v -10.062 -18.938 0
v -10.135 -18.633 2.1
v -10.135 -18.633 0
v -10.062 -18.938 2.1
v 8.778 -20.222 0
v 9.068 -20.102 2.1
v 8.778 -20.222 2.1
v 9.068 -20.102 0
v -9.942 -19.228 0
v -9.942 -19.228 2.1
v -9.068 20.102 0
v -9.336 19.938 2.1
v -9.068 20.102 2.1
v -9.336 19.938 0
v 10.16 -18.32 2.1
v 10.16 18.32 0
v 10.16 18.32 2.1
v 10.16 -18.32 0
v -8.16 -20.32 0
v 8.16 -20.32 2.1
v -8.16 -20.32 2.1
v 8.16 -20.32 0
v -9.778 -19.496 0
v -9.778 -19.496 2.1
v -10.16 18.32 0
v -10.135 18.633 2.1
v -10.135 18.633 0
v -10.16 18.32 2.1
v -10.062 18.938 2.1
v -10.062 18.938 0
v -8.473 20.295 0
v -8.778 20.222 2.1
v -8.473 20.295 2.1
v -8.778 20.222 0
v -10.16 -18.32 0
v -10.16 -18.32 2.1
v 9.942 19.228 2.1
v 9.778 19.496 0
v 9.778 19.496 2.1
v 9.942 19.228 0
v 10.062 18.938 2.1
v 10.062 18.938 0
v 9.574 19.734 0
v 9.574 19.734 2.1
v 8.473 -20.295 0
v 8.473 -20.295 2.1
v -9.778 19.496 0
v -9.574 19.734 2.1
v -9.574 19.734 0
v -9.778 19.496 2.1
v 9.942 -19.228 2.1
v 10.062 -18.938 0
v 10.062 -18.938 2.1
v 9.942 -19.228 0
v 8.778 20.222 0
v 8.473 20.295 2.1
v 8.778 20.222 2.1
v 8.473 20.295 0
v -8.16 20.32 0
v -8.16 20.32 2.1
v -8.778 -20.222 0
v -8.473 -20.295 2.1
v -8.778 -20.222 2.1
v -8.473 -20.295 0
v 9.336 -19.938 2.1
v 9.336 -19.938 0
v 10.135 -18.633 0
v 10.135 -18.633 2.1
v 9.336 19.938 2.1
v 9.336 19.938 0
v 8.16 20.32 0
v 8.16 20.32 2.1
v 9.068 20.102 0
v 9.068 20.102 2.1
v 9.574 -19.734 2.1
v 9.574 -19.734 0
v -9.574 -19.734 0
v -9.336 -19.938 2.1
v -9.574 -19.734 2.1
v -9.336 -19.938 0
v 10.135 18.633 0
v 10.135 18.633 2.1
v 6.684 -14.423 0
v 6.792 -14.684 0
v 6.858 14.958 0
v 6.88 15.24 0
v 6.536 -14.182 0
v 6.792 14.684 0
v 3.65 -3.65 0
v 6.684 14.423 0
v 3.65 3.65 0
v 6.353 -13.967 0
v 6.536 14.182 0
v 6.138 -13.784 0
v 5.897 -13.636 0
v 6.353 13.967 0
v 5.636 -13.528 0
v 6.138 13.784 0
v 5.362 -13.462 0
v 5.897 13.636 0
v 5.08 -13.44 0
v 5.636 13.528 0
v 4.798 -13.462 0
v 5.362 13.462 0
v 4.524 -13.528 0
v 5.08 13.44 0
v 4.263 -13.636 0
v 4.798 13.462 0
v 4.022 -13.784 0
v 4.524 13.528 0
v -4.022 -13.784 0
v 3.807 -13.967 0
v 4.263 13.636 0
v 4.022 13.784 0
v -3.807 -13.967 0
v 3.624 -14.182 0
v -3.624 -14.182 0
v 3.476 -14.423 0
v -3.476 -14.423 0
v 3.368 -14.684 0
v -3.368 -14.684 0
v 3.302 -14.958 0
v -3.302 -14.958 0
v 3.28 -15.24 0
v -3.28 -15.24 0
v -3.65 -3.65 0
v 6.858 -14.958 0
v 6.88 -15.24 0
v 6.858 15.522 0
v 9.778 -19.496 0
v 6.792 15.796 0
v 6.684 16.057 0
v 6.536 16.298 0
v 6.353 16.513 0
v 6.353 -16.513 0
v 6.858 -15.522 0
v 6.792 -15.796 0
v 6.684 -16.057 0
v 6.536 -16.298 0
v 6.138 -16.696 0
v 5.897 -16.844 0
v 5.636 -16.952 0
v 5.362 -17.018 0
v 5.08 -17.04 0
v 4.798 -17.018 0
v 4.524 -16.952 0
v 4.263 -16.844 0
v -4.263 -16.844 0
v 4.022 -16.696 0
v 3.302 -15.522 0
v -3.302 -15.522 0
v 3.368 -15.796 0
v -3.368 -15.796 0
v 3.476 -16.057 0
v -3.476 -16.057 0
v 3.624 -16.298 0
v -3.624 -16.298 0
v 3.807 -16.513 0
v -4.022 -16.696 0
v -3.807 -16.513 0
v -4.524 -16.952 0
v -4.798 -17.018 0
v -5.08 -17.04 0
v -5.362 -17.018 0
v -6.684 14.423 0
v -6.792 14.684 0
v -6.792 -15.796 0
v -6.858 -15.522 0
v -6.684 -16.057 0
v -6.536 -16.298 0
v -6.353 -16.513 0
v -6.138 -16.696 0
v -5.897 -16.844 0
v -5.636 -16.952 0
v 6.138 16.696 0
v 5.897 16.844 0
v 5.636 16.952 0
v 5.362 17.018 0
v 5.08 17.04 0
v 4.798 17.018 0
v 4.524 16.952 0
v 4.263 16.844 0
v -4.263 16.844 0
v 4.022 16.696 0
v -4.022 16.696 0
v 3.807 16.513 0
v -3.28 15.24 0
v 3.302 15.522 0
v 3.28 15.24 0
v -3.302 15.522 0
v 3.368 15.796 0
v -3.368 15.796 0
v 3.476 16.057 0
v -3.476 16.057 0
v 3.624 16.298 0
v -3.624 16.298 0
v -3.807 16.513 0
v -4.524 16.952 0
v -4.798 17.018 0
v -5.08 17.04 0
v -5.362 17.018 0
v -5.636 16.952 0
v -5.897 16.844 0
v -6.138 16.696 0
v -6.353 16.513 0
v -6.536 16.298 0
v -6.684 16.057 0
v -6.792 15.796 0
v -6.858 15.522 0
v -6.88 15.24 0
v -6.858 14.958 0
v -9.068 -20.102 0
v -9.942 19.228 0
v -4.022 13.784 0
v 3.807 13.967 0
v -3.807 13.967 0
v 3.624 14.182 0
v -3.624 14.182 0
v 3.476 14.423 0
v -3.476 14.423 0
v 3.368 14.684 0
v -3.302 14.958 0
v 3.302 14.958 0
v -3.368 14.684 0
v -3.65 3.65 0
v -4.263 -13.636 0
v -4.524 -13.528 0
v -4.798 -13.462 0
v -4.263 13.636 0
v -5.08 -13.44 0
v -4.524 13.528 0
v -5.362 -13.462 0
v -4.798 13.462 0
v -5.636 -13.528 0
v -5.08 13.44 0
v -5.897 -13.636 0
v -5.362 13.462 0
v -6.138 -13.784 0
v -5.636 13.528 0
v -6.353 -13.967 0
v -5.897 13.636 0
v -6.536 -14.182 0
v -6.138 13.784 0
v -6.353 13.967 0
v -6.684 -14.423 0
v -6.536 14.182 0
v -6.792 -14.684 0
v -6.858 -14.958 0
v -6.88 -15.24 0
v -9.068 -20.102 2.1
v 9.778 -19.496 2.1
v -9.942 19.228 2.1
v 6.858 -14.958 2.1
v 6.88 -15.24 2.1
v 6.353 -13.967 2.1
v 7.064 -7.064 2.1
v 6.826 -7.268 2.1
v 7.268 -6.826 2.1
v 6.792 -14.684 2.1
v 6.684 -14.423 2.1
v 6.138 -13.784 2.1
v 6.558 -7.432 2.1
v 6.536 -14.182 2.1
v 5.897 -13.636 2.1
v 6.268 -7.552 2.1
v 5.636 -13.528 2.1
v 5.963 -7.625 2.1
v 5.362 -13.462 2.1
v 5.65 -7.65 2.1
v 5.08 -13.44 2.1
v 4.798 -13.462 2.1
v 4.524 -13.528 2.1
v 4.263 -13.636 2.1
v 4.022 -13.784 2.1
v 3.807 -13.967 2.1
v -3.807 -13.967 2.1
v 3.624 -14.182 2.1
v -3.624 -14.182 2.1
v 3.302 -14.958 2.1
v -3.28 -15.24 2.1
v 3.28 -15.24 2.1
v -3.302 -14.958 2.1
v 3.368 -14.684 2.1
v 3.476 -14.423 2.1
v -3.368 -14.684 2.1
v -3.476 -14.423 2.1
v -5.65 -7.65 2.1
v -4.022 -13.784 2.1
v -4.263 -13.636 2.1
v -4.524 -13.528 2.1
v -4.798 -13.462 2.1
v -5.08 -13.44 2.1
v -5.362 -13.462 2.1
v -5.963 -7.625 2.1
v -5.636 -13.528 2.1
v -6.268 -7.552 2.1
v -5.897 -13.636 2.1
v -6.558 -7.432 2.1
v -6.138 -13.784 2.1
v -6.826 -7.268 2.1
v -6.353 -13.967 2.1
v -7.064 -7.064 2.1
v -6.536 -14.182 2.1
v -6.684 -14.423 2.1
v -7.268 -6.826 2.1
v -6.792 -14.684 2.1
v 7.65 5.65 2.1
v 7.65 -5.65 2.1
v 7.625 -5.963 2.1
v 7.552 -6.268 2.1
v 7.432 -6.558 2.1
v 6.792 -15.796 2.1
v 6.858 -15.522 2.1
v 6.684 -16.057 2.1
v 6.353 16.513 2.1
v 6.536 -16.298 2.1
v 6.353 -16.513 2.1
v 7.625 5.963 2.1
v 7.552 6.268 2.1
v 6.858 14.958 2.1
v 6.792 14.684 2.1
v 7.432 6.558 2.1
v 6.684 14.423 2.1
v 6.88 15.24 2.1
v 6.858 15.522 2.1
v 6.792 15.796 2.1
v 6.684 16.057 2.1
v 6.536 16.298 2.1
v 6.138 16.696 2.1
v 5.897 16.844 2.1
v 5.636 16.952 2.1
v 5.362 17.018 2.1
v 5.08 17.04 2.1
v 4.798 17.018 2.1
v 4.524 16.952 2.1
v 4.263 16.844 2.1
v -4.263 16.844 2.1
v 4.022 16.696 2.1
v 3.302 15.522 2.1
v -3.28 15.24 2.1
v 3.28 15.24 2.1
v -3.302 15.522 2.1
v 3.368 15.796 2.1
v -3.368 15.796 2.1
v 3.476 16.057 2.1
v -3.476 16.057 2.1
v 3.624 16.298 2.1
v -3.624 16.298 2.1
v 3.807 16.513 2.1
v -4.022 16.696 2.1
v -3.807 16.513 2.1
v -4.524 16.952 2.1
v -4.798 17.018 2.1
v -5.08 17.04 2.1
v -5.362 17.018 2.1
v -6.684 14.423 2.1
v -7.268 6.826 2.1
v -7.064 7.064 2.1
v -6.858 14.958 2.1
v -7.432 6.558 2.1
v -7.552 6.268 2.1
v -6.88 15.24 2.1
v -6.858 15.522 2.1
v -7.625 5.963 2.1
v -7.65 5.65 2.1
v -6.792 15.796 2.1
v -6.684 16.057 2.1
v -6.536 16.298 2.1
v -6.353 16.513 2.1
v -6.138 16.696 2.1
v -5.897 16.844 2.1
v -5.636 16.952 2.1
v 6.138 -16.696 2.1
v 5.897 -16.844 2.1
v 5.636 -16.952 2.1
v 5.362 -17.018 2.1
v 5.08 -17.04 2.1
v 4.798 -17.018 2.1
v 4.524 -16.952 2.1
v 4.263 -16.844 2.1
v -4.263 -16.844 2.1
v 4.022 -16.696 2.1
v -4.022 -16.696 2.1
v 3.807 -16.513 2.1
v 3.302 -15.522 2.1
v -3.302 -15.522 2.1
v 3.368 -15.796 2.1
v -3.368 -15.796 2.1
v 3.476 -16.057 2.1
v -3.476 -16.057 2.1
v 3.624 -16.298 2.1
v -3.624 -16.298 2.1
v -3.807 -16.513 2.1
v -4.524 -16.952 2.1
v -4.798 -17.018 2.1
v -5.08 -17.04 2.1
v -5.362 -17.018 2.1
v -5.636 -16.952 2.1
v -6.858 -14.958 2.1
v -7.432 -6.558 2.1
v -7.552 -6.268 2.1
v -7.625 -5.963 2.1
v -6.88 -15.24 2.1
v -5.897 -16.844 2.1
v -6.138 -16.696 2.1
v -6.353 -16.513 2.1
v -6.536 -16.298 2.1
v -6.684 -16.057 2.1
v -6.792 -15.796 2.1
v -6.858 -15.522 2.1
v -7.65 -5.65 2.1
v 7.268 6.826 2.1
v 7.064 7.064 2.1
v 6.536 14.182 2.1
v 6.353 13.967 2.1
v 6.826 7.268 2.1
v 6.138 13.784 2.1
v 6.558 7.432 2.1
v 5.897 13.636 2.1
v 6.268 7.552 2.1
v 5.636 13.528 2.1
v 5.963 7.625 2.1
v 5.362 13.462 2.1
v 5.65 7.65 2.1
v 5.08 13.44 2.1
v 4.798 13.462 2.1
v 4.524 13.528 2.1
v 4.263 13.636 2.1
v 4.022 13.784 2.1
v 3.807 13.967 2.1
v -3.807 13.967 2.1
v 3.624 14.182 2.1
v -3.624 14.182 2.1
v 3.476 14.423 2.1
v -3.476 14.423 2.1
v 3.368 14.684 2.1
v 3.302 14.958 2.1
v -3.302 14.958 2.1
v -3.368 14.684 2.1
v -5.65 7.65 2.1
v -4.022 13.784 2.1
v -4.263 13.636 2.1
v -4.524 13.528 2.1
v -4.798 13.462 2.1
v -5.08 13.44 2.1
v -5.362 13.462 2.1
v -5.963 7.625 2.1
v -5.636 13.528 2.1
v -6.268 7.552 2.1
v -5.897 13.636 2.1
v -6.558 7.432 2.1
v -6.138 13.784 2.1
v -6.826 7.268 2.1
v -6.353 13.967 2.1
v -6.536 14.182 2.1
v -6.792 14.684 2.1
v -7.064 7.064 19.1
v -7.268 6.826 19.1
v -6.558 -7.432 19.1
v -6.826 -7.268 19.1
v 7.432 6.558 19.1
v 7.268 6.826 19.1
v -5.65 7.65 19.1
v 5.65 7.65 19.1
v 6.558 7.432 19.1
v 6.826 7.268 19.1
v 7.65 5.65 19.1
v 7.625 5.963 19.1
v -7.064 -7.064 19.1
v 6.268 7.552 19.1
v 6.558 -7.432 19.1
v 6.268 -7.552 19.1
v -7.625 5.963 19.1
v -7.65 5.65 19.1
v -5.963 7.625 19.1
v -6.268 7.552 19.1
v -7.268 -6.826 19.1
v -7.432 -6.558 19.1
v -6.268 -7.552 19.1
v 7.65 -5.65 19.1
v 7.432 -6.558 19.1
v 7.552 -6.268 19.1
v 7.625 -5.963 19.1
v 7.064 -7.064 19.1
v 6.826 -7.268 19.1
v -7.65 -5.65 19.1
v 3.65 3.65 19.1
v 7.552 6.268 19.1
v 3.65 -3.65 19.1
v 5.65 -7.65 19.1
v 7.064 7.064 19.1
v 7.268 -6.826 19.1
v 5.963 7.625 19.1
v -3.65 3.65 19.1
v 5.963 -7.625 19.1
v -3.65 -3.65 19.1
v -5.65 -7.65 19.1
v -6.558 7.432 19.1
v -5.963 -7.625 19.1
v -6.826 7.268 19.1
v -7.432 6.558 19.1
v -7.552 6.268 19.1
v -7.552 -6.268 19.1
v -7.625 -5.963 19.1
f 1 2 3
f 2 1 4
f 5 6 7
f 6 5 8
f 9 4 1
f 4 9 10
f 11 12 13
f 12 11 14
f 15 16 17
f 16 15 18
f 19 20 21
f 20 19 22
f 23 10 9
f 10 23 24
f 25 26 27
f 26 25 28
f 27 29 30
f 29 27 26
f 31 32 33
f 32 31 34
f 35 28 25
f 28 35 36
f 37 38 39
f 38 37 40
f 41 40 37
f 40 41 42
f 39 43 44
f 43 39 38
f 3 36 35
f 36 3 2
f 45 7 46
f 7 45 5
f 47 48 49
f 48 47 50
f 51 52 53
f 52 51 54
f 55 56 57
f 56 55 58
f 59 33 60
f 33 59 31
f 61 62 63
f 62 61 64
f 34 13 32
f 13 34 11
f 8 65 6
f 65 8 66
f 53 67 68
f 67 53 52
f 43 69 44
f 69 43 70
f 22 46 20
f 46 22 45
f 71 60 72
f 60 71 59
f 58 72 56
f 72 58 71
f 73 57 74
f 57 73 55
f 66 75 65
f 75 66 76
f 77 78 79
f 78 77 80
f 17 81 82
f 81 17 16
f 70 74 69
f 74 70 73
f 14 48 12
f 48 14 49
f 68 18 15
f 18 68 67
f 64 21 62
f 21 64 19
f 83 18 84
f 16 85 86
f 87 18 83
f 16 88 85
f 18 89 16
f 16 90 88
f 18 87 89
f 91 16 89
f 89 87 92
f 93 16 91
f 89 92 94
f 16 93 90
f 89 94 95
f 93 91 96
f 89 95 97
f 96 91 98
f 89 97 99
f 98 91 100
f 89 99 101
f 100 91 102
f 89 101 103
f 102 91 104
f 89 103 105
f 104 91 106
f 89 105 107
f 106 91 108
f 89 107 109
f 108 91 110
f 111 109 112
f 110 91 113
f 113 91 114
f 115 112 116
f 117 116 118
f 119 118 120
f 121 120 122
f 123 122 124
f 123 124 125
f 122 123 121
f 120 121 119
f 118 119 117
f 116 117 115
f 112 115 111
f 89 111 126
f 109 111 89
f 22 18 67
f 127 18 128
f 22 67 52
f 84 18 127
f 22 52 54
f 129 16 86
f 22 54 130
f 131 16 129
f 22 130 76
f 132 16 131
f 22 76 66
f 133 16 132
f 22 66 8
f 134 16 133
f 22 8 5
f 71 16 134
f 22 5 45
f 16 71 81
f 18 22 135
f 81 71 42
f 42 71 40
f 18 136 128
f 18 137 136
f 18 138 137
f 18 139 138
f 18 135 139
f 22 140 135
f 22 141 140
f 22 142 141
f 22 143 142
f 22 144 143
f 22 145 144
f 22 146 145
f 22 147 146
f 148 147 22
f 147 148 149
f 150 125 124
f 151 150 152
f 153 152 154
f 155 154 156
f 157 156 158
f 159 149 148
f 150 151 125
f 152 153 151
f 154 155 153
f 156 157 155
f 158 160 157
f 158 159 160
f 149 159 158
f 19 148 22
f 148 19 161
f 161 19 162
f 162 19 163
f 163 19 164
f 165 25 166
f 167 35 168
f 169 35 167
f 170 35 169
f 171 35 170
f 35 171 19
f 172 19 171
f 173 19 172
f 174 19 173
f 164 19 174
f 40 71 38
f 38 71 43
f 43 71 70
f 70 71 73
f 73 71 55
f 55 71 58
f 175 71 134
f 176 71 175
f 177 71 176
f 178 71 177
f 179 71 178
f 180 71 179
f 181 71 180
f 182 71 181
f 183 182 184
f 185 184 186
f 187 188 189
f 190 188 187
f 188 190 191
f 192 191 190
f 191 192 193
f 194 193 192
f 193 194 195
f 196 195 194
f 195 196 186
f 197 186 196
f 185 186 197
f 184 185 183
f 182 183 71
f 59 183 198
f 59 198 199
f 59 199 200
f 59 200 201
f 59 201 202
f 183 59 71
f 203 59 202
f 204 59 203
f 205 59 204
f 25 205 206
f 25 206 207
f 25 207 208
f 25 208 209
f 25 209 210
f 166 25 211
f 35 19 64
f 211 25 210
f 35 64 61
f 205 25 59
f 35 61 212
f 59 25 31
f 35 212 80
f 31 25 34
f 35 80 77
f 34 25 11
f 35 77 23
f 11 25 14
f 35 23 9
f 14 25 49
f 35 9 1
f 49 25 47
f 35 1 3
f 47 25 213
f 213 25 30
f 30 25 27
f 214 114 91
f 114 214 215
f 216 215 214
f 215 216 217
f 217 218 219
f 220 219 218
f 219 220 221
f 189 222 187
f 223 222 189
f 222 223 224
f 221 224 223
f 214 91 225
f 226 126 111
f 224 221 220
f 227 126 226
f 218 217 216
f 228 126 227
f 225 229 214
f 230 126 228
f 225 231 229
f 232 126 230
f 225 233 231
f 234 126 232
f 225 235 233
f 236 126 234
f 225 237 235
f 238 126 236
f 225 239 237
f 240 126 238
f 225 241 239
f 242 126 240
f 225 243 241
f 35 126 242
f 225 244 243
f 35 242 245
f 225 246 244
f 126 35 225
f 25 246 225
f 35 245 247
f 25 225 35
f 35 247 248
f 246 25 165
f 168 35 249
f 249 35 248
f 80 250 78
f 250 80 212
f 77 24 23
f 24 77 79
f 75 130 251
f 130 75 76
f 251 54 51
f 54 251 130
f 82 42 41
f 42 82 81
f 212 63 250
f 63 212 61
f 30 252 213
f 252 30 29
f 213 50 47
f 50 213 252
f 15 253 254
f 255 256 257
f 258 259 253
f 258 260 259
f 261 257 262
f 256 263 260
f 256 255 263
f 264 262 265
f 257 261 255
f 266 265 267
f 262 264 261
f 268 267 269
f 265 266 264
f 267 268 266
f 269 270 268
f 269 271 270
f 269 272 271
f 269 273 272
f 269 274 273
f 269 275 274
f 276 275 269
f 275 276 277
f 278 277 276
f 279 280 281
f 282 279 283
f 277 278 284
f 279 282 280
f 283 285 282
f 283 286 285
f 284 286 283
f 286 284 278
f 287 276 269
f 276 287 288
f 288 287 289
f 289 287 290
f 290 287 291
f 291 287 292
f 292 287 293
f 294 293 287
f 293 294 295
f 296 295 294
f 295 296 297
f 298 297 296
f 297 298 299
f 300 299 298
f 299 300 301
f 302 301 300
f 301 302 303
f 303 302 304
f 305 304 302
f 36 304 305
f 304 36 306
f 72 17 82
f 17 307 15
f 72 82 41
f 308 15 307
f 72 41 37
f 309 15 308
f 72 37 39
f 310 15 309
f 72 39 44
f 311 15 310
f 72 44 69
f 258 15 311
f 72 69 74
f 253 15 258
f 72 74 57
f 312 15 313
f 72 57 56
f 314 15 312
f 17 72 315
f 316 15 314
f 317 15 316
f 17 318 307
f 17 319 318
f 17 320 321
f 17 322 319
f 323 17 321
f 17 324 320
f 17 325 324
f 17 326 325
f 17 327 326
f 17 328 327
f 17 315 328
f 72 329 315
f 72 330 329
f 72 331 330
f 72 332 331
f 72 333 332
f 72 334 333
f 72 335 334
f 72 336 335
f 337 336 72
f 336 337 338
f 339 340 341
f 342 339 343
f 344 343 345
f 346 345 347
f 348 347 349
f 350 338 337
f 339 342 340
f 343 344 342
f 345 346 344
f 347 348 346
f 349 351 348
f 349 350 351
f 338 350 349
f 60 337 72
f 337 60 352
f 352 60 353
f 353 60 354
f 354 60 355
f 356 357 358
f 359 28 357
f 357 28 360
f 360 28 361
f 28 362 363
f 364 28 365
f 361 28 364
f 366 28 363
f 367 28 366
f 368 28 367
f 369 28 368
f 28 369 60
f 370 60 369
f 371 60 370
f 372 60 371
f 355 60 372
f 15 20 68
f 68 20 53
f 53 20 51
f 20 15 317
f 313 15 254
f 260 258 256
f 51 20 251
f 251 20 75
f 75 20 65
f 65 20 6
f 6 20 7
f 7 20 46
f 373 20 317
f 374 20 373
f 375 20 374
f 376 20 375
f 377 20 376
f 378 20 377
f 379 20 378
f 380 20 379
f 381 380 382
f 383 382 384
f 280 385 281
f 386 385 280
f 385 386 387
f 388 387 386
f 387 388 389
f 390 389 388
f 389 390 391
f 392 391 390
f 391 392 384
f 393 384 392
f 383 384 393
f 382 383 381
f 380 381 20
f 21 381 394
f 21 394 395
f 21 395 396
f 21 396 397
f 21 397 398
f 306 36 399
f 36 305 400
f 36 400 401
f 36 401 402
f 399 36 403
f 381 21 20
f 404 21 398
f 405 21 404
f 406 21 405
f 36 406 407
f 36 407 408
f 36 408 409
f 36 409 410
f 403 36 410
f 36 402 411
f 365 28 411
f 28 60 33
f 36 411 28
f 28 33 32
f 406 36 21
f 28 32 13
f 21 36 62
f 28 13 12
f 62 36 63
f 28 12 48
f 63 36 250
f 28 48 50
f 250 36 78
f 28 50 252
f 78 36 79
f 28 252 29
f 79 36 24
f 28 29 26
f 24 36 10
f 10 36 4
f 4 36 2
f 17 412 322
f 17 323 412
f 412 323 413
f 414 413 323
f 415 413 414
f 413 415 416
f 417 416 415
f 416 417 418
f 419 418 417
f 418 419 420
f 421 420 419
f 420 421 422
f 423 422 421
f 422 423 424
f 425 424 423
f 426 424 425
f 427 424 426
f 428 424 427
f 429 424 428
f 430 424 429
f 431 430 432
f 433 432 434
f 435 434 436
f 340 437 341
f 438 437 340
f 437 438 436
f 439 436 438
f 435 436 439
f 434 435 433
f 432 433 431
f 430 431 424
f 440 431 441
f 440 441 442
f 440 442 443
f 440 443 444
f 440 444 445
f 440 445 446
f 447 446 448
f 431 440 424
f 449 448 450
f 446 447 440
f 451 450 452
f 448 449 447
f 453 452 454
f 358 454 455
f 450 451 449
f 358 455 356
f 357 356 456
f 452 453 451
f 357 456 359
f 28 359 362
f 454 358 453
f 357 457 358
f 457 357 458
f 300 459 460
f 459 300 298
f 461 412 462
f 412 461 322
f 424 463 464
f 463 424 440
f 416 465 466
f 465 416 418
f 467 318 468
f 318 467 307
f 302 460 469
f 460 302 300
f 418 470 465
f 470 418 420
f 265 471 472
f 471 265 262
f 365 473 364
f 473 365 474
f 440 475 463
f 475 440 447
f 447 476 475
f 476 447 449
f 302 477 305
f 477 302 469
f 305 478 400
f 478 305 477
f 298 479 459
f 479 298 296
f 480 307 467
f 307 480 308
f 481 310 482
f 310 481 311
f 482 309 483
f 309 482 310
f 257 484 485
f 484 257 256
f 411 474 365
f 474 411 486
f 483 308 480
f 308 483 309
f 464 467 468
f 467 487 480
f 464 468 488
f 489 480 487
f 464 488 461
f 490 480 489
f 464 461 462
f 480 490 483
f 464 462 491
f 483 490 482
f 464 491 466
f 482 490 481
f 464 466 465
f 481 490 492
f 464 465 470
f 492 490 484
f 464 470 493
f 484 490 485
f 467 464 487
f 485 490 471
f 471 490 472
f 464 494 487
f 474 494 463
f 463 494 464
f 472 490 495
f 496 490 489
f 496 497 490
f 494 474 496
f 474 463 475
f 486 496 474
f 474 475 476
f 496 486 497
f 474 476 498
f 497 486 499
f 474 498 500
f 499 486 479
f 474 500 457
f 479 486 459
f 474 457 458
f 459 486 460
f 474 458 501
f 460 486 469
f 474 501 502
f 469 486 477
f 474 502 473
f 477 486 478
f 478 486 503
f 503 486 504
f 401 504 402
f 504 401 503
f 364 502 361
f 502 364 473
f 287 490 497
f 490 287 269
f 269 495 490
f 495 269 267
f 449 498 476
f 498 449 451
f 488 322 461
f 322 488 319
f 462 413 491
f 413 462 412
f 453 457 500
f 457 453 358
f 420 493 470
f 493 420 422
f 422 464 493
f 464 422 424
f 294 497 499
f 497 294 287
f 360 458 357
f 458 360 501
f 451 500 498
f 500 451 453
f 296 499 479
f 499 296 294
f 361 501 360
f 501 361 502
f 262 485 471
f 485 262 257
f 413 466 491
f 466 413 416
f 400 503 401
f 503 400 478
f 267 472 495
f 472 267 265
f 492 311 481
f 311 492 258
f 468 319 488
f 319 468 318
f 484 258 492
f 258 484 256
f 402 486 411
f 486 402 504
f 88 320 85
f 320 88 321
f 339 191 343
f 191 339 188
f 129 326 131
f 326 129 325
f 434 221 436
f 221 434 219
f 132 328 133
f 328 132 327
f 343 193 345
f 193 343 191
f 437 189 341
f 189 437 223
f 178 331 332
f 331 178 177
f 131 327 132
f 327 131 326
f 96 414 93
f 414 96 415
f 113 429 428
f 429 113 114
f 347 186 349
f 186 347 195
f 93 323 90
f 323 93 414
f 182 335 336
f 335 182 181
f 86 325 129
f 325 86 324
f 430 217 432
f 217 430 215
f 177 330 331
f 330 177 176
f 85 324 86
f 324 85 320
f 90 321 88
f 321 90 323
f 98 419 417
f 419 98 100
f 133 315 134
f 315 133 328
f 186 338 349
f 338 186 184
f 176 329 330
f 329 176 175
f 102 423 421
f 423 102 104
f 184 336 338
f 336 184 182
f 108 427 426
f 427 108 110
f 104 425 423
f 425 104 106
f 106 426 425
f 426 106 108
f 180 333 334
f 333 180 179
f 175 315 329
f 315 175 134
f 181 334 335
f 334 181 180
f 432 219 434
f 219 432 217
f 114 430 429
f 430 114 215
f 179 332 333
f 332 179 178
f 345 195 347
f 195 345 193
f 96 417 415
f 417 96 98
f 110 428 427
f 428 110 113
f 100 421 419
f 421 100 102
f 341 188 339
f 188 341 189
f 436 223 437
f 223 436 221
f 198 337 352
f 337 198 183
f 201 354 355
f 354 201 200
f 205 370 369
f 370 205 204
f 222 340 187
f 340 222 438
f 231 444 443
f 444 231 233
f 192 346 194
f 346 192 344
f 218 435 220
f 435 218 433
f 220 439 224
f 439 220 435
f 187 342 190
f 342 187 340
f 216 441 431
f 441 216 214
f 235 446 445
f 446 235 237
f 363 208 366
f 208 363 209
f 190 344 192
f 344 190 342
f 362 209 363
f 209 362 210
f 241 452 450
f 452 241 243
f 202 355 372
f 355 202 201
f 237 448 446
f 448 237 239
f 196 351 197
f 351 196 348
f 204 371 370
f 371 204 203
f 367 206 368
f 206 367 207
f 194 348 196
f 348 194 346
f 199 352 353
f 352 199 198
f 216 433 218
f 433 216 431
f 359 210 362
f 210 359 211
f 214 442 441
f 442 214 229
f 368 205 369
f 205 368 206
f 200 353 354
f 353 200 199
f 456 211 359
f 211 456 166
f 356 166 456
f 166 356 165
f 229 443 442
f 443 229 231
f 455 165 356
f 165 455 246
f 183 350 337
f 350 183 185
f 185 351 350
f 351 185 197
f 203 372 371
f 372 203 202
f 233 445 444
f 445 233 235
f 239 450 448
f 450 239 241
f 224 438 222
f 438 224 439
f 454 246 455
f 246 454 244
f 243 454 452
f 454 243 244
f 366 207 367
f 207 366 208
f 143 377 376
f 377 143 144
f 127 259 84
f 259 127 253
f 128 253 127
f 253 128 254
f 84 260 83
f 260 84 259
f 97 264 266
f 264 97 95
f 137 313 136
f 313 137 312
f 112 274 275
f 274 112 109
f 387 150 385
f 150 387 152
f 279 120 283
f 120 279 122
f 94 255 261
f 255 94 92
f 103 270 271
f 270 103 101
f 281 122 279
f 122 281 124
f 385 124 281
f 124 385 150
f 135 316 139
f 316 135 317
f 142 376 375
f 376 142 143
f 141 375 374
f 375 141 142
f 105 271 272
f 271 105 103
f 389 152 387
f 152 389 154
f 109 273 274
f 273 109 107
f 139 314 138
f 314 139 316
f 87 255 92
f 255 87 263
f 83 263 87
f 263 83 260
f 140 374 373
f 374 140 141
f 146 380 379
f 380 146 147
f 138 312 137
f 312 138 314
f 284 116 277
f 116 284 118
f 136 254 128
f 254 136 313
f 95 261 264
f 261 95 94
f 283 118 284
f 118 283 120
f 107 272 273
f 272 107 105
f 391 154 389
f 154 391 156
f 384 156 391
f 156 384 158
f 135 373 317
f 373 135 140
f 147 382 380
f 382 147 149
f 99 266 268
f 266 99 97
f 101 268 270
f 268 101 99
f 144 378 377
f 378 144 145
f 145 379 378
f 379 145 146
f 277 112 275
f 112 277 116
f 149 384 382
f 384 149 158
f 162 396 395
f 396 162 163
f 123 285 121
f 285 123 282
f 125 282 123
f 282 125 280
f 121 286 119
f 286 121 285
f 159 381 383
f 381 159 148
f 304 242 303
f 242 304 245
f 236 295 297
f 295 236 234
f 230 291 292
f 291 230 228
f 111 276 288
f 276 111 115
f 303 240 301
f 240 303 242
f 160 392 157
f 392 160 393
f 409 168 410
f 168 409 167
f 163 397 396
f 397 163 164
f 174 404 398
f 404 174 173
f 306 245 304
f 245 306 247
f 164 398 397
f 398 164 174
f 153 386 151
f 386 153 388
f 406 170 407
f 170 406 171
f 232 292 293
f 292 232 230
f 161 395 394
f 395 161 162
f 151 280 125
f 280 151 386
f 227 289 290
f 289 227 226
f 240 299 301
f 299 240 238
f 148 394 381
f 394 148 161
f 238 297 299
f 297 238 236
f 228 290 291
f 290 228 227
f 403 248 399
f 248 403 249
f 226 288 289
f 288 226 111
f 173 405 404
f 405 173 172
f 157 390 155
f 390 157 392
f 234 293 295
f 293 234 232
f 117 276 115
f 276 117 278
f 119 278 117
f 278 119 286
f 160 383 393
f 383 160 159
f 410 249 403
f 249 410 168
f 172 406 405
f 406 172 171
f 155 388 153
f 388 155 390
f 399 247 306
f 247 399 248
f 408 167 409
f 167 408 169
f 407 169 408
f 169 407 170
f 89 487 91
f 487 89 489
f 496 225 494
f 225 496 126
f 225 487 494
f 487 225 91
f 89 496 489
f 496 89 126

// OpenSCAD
// file: ../configuration.scad
$fn=40; // model faces resolution.

//OBECNE PARAMETRY 
//----------------------------------------------------------------
//----------------------------------------------------------------

vyska_krystalu=24;
presah_krystalu=5;
vyska_drzaku_krystalu=vyska_krystalu-presah_krystalu;


zakladna_krystalu_x=7.3; //1.3mm rezerva hrana SIPM je 7mm
zakladna_krystalu_y=7.3;
sila_steny=4;
sila_materialu_zakladny=2;


vyska_zapusti_pro_PCB=0; //výčka krycího matriálu pro PCB a zároveň pro vytvoření vany pro zalití silikonem, kvůli světlotěsnoti.
vyska_SIPM_nad_PCB=2.4; //výška celého SIPM senzoru
tolerance_pro_dotazeni_k_SIPM=-0.5; // kvůli dotažení krystalu k SIPM
velikost_modulu_x=2; //počet der
velikost_modulu_y=4;
rotec_der_modulu=10.16;

vyska_matky=3;
sirka_matky=6.7;
prumer_sroubu=3.4;
prumer_hlavy_sroubu=6;
// main file
include <../configuration.scad>
 
  //translate([0,0,10]) 
 //SIPMBOX01B();
 
 
  difference (){
      union() {
 //Zakladna
 translate([-(velikost_modulu_x * rotec_der_modulu)/2+2,-(velikost_modulu_y * rotec_der_modulu)/2+2,0])
 
 minkowski()
{
  cube([velikost_modulu_x * rotec_der_modulu-2*2,velikost_modulu_y * rotec_der_modulu-2*2,sila_materialu_zakladny]);
  cylinder(r=2,h=0.1);
}


//drzak krystalu
 translate([-(zakladna_krystalu_x+2*sila_steny)/2+2,-(zakladna_krystalu_y+2*sila_steny)/2+2,0])
 
 minkowski()
{
  cube([zakladna_krystalu_x-2*2+2*sila_steny,zakladna_krystalu_y-2*2+2*sila_steny,vyska_drzaku_krystalu]);
  cylinder(r=2,h=0.1);
}
}
//otvor na sroub 1
translate([(velikost_modulu_x-1)*rotec_der_modulu/2,(velikost_modulu_y-1)*rotec_der_modulu/2,-0.01]) 
 
 translate([0,0,-0.01]) 
        cylinder (h = sila_materialu_zakladny+0.12, r= (prumer_sroubu+0.2)/2, $fn=40);


 //otvor na sroub 2
    translate([-(velikost_modulu_x-1)*rotec_der_modulu/2,(velikost_modulu_y-1)*rotec_der_modulu/2,-0.01]) 
      translate([0,0,-0.01]) 
        cylinder (h = sila_materialu_zakladny+0.12, r= (prumer_sroubu+0.2)/2, $fn=40);

    //otvor na sroub 3
    translate([(velikost_modulu_x-1)*rotec_der_modulu/2,-(velikost_modulu_y-1)*rotec_der_modulu/2,-0.01]) 
      translate([0,0,-0.01]) 
        cylinder (h = sila_materialu_zakladny+0.12, r= (prumer_sroubu+0.2)/2, $fn=40);
//otvor na sroub 4
    translate([-(velikost_modulu_x-1)*rotec_der_modulu/2,-(velikost_modulu_y-1)*rotec_der_modulu/2,-0.01]) 
      translate([0,0,-0.01]) 
        cylinder (h = sila_materialu_zakladny+0.12, r= (prumer_sroubu+0.2)/2, $fn=40);
 
 
 //otvor na krystal
 
 translate([-(zakladna_krystalu_x)/2,-(zakladna_krystalu_y)/2,0])
 cube([zakladna_krystalu_x,zakladna_krystalu_y,vyska_drzaku_krystalu+0.12]);
} 
 
module SIPMBOX01B()
{ 

  crystal_refletctor_thickness = 0.4;

 translate([0,0,(vyska_krystalu+sila_steny+vyska_zapusti_pro_PCB+vyska_SIPM_nad_PCB+tolerance_pro_dotazeni_k_SIPM)/2]) 
    difference (){
      //základní kvádr
      cube([ 2 * sila_steny + velikost_modulu_x * rotec_der_modulu + 2 * crystal_refletctor_thickness, 2 * sila_steny+velikost_modulu_y*rotec_der_modulu, vyska_krystalu + sila_steny + vyska_zapusti_pro_PCB + vyska_SIPM_nad_PCB + tolerance_pro_dotazeni_k_SIPM], center = true);
        
      //výřez v hlavním kvádru
      translate([0,0,(vyska_krystalu + sila_steny + vyska_zapusti_pro_PCB + vyska_SIPM_nad_PCB + tolerance_pro_dotazeni_k_SIPM)/2-(vyska_zapusti_pro_PCB+vyska_SIPM_nad_PCB+tolerance_pro_dotazeni_k_SIPM)/2]) 
        cube([velikost_modulu_x * rotec_der_modulu + 2 * crystal_refletctor_thickness, velikost_modulu_y * rotec_der_modulu, vyska_zapusti_pro_PCB+vyska_SIPM_nad_PCB+tolerance_pro_dotazeni_k_SIPM+0.01], center = true);
        
         //výřez v hlavním kvádru pro krystaly
      translate([0,0,-(vyska_krystalu + sila_steny + vyska_zapusti_pro_PCB + vyska_SIPM_nad_PCB + tolerance_pro_dotazeni_k_SIPM)/2+sila_steny+vyska_krystalu/2]) 
        cube([zakladna_krystalu_x, zakladna_krystalu_y, vyska_krystalu+0.01], center = true);
        
        
      //výřez otvorů pro šrouby do kvádru
      translate([(velikost_modulu_x-1)*rotec_der_modulu/2,(velikost_modulu_y-1)*rotec_der_modulu/2,-0.01]) 
        cylinder (h = vyska_krystalu+sila_steny+vyska_zapusti_pro_PCB+vyska_SIPM_nad_PCB+tolerance_pro_dotazeni_k_SIPM+0.01, r= (prumer_sroubu+0.2)/2, $fn=40, center = true);  
        
   //výřez otvorů pro zapuštění šroubu do kvádru
      translate([(velikost_modulu_x-1)*rotec_der_modulu/2,(velikost_modulu_y-1)*rotec_der_modulu/2,-0.01]) 
        cylinder (h = vyska_krystalu+sila_steny+vyska_zapusti_pro_PCB+vyska_SIPM_nad_PCB+tolerance_pro_dotazeni_k_SIPM+0.01, r= (prumer_hlavy_sroubu+0.2)/2, $fn=40, center = true);       
        
        
        
      //výřez otvorů pro šrouby do kvádru
      translate([-(velikost_modulu_x-1)*rotec_der_modulu/2,(velikost_modulu_y-1)*rotec_der_modulu/2,-0.01]) 
        cylinder (h = vyska_krystalu+sila_steny+vyska_zapusti_pro_PCB+vyska_SIPM_nad_PCB+tolerance_pro_dotazeni_k_SIPM+0.01, r= (prumer_sroubu+0.2)/2, $fn=40, center = true);
        
      //výřez otvorů pro zapuštění šroubu do kvádru   
         translate([-(velikost_modulu_x-1)*rotec_der_modulu/2,(velikost_modulu_y-1)*rotec_der_modulu/2,-0.01]) 
        cylinder (h = vyska_krystalu+sila_steny+vyska_zapusti_pro_PCB+vyska_SIPM_nad_PCB+tolerance_pro_dotazeni_k_SIPM+0.01, r= (prumer_hlavy_sroubu+0.2)/2, $fn=40, center = true);
  
      //výřez otvorů pro šrouby do kvádru
      translate([(velikost_modulu_x-1)*rotec_der_modulu/2,-(velikost_modulu_y-1)*rotec_der_modulu/2,-0.01]) 
        cylinder (h = vyska_krystalu+sila_steny+vyska_zapusti_pro_PCB+vyska_SIPM_nad_PCB+tolerance_pro_dotazeni_k_SIPM+0.01, r= (prumer_sroubu+0.2)/2, $fn=40, center = true); 
      
    //výřez otvorů pro zapuštění šroubu do kvádru    
         translate([(velikost_modulu_x-1)*rotec_der_modulu/2,-(velikost_modulu_y-1)*rotec_der_modulu/2,-0.01]) 
        cylinder (h = vyska_krystalu+sila_steny+vyska_zapusti_pro_PCB+vyska_SIPM_nad_PCB+tolerance_pro_dotazeni_k_SIPM+0.01, r= (prumer_hlavy_sroubu+0.2)/2, $fn=40, center = true); 
 
      //výřez otvorů pro šrouby do kvádru
      translate([-(velikost_modulu_x-1)*rotec_der_modulu/2,-(velikost_modulu_y-1)*rotec_der_modulu/2,-0.01]) 
        cylinder (h = vyska_krystalu+sila_steny+vyska_zapusti_pro_PCB+vyska_SIPM_nad_PCB+tolerance_pro_dotazeni_k_SIPM+0.01, r= (prumer_sroubu+0.2)/2, $fn=40, center = true);  
 
//výřez otvorů pro zapuštění šroubu do kvádru  
  translate([-(velikost_modulu_x-1)*rotec_der_modulu/2,-(velikost_modulu_y-1)*rotec_der_modulu/2,-0.01]) 
        cylinder (h = vyska_krystalu+sila_steny+vyska_zapusti_pro_PCB+vyska_SIPM_nad_PCB+tolerance_pro_dotazeni_k_SIPM+0.01, r= (prumer_hlavy_sroubu+0.2)/2, $fn=40, center = true); 
        
    }

    //sloupek1  
    translate([(velikost_modulu_x-1)*rotec_der_modulu/2,(velikost_modulu_y-1)*rotec_der_modulu/2,-0.01]) 
      SLOUPEK();

    //výřez otvorů pro šrouby do kvádru
    translate([-(velikost_modulu_x-1)*rotec_der_modulu/2,(velikost_modulu_y-1)*rotec_der_modulu/2,-0.01]) 
      SLOUPEK();

    //výřez otvorů pro šrouby do kvádru
    translate([(velikost_modulu_x-1)*rotec_der_modulu/2,-(velikost_modulu_y-1)*rotec_der_modulu/2,-0.01]) 
      SLOUPEK();

    //výřez otvorů pro šrouby do kvádru
    translate([-(velikost_modulu_x-1)*rotec_der_modulu/2,-(velikost_modulu_y-1)*rotec_der_modulu/2,-0.01]) 
      SLOUPEK();
}
